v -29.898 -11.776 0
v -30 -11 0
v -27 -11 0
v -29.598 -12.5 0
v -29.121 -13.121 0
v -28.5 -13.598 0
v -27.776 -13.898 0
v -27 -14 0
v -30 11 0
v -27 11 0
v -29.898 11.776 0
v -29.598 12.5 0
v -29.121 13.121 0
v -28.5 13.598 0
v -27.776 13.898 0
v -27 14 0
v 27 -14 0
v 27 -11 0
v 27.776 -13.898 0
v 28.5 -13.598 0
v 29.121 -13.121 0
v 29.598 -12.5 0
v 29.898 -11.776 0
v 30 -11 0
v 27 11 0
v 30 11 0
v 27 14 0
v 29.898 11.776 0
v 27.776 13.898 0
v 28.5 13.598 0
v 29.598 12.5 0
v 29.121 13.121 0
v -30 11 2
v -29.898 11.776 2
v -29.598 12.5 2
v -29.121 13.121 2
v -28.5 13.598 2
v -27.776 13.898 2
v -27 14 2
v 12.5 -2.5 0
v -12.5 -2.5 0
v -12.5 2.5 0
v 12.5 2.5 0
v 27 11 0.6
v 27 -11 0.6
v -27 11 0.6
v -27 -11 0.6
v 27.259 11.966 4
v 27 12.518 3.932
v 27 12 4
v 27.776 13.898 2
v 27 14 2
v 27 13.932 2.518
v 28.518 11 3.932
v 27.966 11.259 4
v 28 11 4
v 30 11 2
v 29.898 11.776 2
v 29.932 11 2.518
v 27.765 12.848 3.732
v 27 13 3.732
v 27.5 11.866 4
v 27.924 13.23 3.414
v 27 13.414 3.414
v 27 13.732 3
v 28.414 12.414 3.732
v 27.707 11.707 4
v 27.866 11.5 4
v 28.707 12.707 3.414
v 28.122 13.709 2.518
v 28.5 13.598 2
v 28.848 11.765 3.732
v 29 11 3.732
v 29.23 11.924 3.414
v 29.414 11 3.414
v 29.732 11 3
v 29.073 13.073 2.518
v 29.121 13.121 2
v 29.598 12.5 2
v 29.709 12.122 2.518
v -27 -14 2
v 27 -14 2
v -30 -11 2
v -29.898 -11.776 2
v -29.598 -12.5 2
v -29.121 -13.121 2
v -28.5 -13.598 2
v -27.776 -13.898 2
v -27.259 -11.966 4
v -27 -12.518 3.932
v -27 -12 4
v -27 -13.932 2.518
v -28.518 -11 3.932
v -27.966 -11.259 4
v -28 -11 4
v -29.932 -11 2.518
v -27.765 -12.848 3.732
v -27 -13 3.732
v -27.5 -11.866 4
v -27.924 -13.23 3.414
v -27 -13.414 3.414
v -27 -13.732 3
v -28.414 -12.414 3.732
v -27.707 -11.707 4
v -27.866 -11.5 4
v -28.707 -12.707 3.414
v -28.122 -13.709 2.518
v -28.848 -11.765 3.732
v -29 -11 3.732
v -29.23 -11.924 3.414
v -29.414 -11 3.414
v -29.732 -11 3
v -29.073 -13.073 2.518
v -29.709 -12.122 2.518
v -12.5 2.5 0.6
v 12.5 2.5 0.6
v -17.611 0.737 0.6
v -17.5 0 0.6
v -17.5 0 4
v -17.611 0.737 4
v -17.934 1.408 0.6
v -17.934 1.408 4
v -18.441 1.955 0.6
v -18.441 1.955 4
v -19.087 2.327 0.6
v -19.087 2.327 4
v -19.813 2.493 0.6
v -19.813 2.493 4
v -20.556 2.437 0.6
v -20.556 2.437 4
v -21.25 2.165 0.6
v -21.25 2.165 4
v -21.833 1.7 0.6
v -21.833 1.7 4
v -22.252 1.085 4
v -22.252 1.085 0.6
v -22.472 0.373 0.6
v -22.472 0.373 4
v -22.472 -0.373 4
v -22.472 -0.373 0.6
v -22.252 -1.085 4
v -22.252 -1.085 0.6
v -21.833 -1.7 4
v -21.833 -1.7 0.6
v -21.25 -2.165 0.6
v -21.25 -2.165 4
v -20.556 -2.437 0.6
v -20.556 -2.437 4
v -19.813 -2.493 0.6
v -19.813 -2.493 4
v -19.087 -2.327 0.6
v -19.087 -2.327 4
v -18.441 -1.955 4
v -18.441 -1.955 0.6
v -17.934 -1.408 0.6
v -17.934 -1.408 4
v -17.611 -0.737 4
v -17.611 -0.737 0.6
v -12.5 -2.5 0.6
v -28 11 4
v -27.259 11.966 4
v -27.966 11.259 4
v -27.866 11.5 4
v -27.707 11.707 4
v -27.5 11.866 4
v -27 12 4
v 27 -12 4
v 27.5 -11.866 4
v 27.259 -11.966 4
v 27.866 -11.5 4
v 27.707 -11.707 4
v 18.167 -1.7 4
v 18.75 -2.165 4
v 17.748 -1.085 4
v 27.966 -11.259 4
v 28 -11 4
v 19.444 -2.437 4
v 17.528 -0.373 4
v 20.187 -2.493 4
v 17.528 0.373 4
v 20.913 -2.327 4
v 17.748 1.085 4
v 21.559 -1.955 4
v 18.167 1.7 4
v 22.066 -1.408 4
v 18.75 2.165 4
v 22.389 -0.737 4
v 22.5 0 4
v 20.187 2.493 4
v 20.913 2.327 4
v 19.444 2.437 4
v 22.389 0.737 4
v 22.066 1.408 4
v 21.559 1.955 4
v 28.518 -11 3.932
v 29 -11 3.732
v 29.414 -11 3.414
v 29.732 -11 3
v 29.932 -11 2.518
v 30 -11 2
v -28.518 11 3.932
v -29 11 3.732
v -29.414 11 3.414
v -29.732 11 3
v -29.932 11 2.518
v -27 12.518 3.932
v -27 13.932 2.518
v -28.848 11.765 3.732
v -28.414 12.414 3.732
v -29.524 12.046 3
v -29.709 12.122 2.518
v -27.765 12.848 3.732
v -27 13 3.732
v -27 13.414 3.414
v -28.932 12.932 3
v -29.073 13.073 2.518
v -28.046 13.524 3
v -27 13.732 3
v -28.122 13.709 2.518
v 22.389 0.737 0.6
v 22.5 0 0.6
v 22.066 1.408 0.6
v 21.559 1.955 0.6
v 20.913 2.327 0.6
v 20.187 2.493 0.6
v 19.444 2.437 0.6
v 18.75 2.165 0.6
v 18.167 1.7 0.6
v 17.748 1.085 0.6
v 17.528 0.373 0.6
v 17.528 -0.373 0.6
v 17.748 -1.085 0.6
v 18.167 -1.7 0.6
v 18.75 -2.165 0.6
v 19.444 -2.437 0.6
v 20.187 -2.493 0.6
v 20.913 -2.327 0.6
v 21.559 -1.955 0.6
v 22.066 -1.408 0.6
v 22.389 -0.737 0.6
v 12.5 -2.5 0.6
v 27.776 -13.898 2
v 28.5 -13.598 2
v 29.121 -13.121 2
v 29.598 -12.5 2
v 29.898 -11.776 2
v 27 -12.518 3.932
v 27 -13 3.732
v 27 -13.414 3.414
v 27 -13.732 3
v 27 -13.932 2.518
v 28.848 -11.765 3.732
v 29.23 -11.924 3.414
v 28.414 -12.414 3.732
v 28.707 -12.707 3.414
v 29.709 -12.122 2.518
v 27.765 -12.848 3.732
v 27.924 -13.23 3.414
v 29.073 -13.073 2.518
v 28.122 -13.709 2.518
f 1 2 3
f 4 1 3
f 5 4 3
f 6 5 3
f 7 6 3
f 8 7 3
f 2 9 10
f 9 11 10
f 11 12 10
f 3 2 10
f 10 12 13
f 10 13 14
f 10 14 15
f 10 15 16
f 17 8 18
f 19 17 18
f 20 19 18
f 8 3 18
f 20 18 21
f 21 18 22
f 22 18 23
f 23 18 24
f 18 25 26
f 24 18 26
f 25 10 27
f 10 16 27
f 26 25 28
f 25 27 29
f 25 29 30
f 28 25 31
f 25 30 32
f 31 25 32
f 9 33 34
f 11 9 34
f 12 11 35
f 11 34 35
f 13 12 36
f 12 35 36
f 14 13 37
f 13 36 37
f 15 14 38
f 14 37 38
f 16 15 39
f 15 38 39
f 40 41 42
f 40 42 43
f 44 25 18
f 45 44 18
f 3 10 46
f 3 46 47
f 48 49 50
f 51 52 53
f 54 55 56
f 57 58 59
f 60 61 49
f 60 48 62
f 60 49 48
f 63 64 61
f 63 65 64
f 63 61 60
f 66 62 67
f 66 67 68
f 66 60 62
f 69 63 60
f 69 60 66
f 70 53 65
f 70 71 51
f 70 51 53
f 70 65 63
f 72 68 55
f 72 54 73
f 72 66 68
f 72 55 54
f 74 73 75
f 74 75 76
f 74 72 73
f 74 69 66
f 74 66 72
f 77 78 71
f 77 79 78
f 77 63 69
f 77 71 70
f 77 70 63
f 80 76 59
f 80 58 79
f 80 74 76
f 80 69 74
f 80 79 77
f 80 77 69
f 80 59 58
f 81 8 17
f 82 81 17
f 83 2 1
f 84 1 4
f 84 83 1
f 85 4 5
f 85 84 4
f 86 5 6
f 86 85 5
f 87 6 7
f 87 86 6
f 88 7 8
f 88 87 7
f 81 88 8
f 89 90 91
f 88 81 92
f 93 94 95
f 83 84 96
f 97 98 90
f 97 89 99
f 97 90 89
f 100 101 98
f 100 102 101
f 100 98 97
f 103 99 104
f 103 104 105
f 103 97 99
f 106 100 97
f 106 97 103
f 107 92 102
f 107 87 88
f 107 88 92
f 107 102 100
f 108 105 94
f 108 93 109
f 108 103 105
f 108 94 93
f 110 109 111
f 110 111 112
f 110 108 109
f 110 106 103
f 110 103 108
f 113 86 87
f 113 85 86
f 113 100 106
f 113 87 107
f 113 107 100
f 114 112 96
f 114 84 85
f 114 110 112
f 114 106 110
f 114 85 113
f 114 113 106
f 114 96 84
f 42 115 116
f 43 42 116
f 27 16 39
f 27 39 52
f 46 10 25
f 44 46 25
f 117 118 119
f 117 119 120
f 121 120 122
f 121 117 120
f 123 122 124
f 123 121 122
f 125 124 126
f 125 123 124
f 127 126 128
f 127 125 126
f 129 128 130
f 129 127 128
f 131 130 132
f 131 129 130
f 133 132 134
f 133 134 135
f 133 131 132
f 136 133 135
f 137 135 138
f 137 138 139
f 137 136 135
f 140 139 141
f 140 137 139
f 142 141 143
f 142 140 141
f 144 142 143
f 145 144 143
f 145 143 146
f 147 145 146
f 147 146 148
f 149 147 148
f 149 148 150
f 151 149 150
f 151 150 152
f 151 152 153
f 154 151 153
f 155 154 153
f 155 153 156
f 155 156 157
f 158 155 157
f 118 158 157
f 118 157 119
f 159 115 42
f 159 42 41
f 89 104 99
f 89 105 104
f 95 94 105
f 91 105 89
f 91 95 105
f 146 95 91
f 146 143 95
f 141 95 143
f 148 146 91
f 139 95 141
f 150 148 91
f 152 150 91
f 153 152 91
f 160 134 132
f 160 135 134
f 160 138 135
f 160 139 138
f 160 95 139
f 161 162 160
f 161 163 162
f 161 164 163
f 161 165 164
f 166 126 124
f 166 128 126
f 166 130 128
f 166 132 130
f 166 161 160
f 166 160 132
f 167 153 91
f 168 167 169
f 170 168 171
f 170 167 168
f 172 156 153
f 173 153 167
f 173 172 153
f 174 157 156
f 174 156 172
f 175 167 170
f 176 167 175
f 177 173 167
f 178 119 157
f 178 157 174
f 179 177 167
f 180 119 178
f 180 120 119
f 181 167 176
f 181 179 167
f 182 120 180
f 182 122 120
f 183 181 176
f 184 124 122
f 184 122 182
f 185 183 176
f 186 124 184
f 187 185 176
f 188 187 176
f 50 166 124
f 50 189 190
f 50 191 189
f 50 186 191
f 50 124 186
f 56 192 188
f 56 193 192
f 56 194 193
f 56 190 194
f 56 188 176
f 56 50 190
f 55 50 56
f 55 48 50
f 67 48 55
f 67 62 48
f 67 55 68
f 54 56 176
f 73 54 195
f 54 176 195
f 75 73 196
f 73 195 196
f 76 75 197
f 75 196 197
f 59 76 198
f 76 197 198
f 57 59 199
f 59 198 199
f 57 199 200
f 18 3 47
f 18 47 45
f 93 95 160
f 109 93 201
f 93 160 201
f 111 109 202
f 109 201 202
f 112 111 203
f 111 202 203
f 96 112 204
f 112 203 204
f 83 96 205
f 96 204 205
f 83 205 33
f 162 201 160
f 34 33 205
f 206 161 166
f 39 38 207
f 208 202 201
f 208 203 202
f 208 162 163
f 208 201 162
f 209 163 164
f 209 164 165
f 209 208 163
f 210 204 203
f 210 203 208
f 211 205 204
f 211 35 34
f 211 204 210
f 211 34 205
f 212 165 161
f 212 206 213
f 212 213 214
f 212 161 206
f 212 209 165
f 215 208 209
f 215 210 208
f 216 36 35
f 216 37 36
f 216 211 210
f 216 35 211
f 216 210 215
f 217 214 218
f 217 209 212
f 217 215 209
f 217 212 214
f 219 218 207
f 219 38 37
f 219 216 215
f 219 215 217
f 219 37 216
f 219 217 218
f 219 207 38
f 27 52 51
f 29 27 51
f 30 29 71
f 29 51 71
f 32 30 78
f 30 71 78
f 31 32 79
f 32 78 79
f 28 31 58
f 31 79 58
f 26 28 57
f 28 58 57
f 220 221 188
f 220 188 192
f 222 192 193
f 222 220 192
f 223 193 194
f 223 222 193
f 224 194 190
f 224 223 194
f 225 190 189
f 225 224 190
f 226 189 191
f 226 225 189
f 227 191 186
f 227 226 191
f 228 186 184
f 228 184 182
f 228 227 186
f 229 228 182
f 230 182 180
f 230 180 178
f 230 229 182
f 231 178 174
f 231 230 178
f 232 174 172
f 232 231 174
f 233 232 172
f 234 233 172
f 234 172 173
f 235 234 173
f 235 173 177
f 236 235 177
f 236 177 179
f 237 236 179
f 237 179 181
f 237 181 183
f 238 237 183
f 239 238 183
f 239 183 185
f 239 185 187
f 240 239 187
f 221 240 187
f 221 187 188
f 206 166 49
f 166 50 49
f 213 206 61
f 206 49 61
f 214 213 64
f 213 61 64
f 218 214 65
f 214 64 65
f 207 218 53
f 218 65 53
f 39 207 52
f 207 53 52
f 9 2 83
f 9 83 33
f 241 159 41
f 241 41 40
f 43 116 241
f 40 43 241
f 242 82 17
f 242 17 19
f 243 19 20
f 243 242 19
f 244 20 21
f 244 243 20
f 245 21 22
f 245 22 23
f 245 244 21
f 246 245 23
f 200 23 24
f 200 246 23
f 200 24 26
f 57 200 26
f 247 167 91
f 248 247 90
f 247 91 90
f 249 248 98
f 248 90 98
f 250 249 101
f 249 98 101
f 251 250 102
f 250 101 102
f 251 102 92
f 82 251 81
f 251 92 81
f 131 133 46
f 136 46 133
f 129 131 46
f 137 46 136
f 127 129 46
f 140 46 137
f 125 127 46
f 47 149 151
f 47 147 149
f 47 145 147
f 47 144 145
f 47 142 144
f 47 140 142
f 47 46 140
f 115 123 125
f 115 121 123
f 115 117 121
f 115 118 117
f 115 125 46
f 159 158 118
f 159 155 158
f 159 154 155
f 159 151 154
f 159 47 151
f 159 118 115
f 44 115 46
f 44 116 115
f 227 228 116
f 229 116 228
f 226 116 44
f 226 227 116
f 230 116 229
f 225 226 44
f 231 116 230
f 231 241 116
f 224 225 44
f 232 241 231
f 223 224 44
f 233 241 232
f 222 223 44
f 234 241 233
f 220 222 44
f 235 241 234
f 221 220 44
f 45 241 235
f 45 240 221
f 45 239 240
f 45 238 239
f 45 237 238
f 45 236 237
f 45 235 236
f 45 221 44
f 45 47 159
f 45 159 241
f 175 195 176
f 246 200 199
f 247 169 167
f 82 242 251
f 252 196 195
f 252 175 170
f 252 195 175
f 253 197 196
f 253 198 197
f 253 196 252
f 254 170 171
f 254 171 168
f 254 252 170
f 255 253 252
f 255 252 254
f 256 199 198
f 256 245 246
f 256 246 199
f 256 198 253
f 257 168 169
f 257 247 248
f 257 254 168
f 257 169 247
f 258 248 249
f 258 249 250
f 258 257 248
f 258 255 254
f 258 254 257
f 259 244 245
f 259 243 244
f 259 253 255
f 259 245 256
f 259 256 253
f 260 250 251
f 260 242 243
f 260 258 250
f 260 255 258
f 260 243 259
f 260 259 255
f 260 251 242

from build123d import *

# Parameters (mm, degrees)
F0_W     = 60
F0_H     = 28
F0_R     = 2.5
F1_DEPTH = 4
F2_W     = 54
F2_H     = 22
F3_DEPTH = 0.6
F4_R     = 3
F5_R     = 2
F6_W     = 25
F6_H     = 5
F7_DEPTH = 0.6


with BuildPart() as f1:
    # F0 (on Top) → F1 (new body)
    with BuildSketch(Plane.XY):
        Rectangle(F0_W, F0_H)
        with Locations((-20, 0)):
            Circle(F0_R, mode=Mode.SUBTRACT)
        with Locations((20, 0)):
            Circle(F0_R, mode=Mode.SUBTRACT)
    extrude(amount=F1_DEPTH)

    # F2 (on face) → F3 (cut)
    with BuildSketch(Plane(origin=(0, 0, 0), x_dir=(1, 0, 0), z_dir=(0, 0, -1))):
        Rectangle(F2_W, F2_H)
    extrude(amount=-F3_DEPTH, mode=Mode.SUBTRACT)

    # F4
    f4_edges = [f1.edges().sort_by_distance(p)[0] for p in [
        (-30, 14, 2),
        (-30, -14, 2),
        (30, -14, 2),
        (30, 14, 2),
    ]]
    fillet(f4_edges, radius=F4_R)

    # F5
    f5_edges = [f1.edges().sort_by_distance(p)[0] for p in [
        (0, 14, 4),
    ]]
    fillet(f5_edges, radius=F5_R)

    # F6 (on face) → F7 (join, through all)
    with BuildSketch(Plane(origin=(0, 0, 0.6), x_dir=(1, 0, 0), z_dir=(0, 0, -1))):
        Rectangle(F6_W, F6_H)
    extrude(amount=F7_DEPTH)


solid = f1.part
